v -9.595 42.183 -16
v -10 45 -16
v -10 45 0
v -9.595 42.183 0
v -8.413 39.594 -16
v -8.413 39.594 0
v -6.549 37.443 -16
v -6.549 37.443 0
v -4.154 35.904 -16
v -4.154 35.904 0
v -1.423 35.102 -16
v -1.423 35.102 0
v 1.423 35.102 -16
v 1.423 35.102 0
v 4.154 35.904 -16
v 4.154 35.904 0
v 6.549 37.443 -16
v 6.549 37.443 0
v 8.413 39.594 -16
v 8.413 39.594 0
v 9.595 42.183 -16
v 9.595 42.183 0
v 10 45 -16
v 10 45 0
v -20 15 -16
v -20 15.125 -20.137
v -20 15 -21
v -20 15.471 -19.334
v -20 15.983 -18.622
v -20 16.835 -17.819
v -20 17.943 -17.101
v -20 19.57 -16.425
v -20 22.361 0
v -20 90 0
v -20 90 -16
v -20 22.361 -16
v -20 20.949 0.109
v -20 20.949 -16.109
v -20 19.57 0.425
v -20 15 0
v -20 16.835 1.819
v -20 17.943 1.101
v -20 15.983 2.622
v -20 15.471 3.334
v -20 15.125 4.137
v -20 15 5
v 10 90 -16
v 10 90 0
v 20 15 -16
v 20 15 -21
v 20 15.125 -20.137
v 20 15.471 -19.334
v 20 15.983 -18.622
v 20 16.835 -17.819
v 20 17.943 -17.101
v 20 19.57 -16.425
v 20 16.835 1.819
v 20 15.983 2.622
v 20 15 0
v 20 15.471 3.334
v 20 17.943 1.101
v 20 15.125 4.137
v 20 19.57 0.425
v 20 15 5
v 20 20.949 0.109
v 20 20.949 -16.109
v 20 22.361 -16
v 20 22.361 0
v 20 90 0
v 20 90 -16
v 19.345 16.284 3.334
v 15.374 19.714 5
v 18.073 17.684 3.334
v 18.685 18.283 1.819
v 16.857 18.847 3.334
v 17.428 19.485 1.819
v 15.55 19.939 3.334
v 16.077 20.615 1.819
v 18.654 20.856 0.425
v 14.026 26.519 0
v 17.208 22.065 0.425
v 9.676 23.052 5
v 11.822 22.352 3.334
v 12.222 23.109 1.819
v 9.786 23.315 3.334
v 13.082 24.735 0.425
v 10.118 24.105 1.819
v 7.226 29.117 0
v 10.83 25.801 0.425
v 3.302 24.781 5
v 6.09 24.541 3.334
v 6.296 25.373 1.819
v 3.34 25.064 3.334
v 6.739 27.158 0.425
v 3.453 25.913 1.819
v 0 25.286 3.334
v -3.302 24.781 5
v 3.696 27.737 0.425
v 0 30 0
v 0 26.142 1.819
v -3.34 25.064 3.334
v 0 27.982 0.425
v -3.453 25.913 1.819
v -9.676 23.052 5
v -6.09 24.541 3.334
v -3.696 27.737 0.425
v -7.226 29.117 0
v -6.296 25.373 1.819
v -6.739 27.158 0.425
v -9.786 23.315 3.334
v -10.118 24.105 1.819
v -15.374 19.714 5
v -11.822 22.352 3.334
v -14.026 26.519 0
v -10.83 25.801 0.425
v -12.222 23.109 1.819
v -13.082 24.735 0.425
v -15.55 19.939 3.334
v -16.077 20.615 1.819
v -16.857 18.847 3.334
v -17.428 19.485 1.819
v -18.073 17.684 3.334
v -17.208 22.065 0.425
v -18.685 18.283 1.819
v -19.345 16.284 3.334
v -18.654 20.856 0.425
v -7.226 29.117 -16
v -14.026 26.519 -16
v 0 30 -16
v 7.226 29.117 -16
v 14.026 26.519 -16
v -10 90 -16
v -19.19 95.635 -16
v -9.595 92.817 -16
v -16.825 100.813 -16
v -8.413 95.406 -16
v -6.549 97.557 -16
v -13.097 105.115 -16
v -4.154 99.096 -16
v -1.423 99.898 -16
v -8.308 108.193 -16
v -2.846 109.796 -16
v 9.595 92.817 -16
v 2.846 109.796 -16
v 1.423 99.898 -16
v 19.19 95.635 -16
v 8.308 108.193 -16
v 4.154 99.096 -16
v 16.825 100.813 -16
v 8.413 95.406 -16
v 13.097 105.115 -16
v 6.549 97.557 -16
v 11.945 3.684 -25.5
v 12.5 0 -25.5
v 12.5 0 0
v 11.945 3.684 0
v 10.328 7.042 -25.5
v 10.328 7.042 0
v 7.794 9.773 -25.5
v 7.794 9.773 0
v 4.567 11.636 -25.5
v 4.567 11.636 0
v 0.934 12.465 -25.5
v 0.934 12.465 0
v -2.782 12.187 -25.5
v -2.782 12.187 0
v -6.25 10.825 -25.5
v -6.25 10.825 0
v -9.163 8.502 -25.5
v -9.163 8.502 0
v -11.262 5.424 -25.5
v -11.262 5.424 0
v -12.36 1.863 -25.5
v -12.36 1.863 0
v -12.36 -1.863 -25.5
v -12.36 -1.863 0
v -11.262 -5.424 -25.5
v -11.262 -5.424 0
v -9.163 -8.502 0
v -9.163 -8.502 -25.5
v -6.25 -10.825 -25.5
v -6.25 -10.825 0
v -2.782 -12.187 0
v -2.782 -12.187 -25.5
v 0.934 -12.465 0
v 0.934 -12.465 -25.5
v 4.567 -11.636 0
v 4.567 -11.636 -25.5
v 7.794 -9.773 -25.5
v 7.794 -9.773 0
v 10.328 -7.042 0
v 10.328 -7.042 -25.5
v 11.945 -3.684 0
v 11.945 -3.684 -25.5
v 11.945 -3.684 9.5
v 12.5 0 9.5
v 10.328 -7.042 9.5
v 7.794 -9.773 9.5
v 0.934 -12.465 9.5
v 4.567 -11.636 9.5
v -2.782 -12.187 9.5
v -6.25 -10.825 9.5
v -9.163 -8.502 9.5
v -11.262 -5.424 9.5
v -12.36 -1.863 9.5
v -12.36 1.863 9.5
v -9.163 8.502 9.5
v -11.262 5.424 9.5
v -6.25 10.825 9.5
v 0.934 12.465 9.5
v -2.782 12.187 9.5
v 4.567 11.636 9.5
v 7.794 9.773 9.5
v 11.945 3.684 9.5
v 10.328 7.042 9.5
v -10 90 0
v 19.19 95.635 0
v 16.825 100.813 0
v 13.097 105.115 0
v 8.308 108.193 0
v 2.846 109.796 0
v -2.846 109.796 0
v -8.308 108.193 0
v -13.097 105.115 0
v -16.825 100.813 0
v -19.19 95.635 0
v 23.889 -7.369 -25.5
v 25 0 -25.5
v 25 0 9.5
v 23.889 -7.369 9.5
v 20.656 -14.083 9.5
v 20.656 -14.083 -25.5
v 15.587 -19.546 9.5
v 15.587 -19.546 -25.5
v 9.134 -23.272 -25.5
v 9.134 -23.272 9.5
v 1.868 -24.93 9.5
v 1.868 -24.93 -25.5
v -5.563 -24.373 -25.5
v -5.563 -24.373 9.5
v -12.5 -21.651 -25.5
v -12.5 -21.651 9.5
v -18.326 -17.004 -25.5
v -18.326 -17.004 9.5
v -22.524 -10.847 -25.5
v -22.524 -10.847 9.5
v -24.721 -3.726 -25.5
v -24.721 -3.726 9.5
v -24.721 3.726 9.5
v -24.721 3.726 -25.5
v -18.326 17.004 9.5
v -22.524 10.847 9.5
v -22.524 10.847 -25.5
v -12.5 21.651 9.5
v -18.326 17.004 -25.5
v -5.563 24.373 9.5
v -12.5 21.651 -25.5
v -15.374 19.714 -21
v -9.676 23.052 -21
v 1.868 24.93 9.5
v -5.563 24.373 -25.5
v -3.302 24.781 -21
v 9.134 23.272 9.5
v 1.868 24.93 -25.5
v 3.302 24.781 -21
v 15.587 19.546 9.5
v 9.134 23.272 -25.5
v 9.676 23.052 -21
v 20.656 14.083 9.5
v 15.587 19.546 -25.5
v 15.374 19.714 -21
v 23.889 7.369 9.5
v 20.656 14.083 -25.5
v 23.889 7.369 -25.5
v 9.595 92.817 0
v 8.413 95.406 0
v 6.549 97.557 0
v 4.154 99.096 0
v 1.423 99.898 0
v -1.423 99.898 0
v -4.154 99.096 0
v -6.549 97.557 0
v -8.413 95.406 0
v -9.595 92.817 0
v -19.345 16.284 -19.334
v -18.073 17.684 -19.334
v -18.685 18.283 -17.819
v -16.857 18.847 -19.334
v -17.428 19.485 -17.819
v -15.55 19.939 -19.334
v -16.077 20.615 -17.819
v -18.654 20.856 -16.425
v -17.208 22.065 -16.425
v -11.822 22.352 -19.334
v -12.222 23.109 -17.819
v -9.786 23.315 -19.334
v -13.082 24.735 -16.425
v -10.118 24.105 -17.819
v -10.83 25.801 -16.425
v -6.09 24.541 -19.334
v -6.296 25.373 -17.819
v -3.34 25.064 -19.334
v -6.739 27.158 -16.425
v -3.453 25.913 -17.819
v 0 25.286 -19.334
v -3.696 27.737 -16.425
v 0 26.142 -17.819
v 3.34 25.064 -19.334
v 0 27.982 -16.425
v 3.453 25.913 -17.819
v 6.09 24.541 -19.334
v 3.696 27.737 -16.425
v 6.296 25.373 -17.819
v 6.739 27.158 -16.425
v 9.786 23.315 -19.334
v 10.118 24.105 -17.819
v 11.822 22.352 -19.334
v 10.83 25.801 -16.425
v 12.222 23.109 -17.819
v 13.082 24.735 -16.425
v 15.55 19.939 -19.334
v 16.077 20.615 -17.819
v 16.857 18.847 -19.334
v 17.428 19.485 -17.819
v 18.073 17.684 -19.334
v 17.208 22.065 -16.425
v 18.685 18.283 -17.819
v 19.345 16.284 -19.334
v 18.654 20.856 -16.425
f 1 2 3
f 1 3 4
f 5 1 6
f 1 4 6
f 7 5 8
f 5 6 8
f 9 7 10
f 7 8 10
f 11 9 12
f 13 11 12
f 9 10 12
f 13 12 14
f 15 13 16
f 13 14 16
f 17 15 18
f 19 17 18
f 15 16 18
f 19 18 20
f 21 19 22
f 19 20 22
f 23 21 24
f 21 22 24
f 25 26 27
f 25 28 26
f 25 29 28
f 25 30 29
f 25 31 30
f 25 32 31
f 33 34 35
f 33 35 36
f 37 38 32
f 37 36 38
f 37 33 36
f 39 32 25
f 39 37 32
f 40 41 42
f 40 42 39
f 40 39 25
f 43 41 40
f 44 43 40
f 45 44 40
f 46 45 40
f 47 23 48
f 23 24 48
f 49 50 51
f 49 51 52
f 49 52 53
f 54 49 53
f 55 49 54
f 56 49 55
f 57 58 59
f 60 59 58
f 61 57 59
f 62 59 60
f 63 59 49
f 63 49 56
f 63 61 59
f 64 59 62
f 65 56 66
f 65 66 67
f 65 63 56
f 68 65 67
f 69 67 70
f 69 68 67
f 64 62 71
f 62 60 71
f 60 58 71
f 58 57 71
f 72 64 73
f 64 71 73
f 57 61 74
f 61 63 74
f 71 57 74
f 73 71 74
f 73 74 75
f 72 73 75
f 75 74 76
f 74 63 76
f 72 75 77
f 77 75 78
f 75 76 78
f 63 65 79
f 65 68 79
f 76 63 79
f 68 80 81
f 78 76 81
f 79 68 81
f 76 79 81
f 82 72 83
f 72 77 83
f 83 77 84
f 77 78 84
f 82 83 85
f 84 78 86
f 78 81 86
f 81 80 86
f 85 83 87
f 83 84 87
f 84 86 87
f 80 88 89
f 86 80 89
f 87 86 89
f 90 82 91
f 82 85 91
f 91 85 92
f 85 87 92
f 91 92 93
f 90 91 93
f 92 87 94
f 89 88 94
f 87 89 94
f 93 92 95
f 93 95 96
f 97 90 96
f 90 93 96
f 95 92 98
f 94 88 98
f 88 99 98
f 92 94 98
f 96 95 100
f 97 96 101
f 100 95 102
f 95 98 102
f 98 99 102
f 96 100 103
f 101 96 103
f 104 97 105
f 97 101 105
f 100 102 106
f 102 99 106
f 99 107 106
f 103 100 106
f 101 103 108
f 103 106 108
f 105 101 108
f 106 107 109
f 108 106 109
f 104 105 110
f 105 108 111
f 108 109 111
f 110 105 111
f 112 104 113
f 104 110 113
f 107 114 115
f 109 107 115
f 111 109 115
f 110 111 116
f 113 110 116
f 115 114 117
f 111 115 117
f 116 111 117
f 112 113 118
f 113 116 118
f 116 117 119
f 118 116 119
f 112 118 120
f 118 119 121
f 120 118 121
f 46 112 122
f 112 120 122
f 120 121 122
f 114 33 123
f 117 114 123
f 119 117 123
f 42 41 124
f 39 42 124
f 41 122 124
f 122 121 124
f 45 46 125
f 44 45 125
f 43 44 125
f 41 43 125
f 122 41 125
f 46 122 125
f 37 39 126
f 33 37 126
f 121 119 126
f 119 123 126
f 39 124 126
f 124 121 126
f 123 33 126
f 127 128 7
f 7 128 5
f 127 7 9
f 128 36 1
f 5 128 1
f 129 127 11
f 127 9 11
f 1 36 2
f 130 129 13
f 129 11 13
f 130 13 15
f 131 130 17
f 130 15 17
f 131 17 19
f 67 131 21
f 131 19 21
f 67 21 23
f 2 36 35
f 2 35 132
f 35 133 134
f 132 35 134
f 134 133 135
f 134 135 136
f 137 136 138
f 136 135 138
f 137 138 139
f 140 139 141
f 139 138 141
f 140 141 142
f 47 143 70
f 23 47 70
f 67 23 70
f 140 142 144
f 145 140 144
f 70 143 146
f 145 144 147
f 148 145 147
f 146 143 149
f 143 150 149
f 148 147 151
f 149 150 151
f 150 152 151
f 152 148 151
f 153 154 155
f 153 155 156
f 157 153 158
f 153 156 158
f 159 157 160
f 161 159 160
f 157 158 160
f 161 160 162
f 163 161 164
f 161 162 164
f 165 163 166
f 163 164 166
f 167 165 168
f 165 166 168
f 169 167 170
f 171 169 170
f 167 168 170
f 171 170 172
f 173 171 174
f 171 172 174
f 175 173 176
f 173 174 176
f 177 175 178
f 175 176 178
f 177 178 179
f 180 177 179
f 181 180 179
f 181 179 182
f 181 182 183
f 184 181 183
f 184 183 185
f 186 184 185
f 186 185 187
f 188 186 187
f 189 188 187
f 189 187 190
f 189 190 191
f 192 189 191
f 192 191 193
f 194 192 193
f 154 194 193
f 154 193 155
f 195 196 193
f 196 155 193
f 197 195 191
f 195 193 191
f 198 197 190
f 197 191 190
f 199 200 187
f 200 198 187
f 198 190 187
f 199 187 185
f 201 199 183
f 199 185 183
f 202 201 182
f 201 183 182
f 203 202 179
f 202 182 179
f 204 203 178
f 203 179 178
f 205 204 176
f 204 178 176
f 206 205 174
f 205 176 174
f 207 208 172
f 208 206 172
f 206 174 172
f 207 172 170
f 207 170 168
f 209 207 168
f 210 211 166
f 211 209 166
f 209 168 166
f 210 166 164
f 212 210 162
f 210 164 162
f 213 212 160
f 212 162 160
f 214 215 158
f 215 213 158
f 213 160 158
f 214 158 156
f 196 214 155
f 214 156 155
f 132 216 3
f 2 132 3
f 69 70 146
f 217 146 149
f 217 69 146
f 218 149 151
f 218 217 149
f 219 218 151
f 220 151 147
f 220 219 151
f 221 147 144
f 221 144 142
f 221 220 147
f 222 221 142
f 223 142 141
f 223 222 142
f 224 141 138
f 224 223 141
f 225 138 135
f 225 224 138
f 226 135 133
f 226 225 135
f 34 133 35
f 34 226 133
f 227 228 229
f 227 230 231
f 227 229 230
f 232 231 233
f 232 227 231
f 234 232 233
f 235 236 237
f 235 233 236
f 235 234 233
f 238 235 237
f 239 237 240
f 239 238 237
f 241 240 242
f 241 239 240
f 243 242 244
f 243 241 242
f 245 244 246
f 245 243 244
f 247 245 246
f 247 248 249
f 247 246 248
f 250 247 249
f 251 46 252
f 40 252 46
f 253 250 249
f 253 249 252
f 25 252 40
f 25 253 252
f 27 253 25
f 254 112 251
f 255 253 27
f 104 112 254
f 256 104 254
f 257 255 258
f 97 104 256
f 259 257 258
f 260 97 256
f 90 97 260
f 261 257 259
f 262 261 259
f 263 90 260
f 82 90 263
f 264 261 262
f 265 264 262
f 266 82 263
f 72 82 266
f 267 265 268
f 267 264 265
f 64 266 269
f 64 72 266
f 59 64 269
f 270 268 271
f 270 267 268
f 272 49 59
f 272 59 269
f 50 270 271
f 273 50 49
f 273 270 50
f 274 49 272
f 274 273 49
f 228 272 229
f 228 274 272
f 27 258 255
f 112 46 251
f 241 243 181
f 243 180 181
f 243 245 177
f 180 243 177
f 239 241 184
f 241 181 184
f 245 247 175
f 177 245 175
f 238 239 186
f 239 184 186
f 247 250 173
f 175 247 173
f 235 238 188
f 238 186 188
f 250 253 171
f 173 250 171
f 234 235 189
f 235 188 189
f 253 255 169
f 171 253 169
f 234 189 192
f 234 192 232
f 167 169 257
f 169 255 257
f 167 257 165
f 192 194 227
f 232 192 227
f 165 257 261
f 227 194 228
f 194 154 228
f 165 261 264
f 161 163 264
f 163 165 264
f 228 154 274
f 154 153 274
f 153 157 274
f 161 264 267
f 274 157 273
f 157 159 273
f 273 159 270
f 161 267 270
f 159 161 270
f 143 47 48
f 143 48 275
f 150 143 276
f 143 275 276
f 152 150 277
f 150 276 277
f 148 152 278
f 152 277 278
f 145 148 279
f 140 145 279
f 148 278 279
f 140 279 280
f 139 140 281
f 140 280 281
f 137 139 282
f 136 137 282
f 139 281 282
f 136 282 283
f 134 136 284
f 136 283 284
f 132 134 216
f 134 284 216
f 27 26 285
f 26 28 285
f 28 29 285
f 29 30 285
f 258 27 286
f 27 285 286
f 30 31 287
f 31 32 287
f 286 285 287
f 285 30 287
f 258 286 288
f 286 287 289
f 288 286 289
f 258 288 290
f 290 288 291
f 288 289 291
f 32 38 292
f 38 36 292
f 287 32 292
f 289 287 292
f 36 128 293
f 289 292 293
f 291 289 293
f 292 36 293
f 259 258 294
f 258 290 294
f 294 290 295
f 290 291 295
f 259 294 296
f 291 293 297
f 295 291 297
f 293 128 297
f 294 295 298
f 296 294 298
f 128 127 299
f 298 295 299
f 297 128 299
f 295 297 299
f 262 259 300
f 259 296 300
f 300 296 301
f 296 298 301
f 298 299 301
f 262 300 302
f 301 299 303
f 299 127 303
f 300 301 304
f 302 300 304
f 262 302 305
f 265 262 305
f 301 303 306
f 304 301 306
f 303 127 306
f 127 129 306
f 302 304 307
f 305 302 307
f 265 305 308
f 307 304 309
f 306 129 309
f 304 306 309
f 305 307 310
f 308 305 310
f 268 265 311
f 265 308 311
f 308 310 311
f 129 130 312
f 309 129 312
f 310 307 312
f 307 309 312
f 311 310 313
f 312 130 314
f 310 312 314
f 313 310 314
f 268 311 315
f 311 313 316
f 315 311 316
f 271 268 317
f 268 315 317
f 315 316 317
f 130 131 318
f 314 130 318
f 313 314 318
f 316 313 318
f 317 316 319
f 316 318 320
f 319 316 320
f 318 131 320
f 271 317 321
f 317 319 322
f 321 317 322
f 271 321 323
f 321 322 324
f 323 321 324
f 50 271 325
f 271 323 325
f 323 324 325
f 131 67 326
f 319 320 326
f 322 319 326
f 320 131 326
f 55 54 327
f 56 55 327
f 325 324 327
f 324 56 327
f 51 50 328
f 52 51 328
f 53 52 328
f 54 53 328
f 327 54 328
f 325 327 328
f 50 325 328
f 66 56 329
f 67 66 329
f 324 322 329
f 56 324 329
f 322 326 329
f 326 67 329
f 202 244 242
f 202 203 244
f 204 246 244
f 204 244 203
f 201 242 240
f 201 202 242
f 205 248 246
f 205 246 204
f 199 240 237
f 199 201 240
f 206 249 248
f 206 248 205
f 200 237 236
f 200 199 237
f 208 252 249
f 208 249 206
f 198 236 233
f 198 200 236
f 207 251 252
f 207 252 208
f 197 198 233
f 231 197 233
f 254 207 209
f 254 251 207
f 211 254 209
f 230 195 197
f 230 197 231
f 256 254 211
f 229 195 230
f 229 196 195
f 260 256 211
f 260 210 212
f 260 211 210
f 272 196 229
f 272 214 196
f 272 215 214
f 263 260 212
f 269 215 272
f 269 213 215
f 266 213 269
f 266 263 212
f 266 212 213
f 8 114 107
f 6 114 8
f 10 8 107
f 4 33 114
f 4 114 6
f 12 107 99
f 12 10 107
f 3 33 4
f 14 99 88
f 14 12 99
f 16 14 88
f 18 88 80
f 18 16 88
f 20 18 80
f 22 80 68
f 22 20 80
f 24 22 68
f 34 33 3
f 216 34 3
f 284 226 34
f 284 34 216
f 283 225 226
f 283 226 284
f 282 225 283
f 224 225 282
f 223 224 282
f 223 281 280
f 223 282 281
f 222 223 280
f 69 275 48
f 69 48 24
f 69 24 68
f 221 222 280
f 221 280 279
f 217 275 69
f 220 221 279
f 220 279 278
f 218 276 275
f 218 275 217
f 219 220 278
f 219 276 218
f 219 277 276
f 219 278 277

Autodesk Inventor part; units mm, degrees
ref_plane "YZ Plane" through (0, 0, 0) normal (1, 0, 0) x (0, 1, 0)
ref_plane "XZ Plane" through (0, 0, 0) normal (0, 1, 0) x (-1, 0, 0)
ref_plane "XY Plane" through (0, 0, 0) normal (0, 0, 1) x (1, 0, 0)
sketch "Náčrt1" plane through (0, 0, 0) normal (0, 0, 1) x (1, 0, 0)
  circle A0 centre (0, 0) radius 25
  dimension "d0" = 50
extrude "Vysunutí1" add sketch "Náčrt1" against normal blind 25.5
sketch "Náčrt2" plane through (0, 0, 0) normal (0, 0, 1) x (1, 0, 0)
  circle A0 centre (0, 0) radius 12.5
  dimension "d3" = 25
extrude "Vysunutí2" cut sketch "Náčrt2" against normal blind 35
sketch "Náčrt3" plane through (0, 0, 0) normal (0, 0, 1) x (1, 0, 0)
  circle A0 centre (0, 0) radius 25 projected
  line L0 (20, 15) -> (20, 90)
  arc A1 (20, 90) -> (-20, 90) centre (0, 90) ccw
  line L1 (-20, 90) -> (-20, 15)
  arc A2 (10, 90) -> (-10, 90) centre (0, 90) ccw
  line L2 (-10, 90) -> (-10, 45)
  arc A3 (-10, 45) -> (10, 45) centre (0, 45) ccw
  line L3 (10, 45) -> (10, 90)
  arc A4 (20, 15) -> (-20, 15) centre (0, 0) ccw
  dimension "d7" = 90
  dimension "d8" = 40
  dimension "d9" = 20
  dimension "d10" = 20
  dimension "d11" = 10
  dimension "d12" = 45
extrude "Vysunutí3" add sketch "Náčrt3" against normal blind 16 contours A0 L1 A1 L0
sketch "Náčrt4" plane through (0, 0, 0) normal (0, 0, 1) x (1, 0, 0)
  circle A0 centre (0, 0) radius 25
  circle A1 centre (0, 0) radius 25 projected
  circle A2 centre (0, 0) radius 12.5
extrude "Vysunutí4" add sketch "Náčrt4" along normal blind 9.5
fillet "Zaoblení1" radius 5 1 edges at (0, 25, 0)
fillet "Zaoblení2" radius 5 1 edges at (0, 25, -16)
properties part number "13"
